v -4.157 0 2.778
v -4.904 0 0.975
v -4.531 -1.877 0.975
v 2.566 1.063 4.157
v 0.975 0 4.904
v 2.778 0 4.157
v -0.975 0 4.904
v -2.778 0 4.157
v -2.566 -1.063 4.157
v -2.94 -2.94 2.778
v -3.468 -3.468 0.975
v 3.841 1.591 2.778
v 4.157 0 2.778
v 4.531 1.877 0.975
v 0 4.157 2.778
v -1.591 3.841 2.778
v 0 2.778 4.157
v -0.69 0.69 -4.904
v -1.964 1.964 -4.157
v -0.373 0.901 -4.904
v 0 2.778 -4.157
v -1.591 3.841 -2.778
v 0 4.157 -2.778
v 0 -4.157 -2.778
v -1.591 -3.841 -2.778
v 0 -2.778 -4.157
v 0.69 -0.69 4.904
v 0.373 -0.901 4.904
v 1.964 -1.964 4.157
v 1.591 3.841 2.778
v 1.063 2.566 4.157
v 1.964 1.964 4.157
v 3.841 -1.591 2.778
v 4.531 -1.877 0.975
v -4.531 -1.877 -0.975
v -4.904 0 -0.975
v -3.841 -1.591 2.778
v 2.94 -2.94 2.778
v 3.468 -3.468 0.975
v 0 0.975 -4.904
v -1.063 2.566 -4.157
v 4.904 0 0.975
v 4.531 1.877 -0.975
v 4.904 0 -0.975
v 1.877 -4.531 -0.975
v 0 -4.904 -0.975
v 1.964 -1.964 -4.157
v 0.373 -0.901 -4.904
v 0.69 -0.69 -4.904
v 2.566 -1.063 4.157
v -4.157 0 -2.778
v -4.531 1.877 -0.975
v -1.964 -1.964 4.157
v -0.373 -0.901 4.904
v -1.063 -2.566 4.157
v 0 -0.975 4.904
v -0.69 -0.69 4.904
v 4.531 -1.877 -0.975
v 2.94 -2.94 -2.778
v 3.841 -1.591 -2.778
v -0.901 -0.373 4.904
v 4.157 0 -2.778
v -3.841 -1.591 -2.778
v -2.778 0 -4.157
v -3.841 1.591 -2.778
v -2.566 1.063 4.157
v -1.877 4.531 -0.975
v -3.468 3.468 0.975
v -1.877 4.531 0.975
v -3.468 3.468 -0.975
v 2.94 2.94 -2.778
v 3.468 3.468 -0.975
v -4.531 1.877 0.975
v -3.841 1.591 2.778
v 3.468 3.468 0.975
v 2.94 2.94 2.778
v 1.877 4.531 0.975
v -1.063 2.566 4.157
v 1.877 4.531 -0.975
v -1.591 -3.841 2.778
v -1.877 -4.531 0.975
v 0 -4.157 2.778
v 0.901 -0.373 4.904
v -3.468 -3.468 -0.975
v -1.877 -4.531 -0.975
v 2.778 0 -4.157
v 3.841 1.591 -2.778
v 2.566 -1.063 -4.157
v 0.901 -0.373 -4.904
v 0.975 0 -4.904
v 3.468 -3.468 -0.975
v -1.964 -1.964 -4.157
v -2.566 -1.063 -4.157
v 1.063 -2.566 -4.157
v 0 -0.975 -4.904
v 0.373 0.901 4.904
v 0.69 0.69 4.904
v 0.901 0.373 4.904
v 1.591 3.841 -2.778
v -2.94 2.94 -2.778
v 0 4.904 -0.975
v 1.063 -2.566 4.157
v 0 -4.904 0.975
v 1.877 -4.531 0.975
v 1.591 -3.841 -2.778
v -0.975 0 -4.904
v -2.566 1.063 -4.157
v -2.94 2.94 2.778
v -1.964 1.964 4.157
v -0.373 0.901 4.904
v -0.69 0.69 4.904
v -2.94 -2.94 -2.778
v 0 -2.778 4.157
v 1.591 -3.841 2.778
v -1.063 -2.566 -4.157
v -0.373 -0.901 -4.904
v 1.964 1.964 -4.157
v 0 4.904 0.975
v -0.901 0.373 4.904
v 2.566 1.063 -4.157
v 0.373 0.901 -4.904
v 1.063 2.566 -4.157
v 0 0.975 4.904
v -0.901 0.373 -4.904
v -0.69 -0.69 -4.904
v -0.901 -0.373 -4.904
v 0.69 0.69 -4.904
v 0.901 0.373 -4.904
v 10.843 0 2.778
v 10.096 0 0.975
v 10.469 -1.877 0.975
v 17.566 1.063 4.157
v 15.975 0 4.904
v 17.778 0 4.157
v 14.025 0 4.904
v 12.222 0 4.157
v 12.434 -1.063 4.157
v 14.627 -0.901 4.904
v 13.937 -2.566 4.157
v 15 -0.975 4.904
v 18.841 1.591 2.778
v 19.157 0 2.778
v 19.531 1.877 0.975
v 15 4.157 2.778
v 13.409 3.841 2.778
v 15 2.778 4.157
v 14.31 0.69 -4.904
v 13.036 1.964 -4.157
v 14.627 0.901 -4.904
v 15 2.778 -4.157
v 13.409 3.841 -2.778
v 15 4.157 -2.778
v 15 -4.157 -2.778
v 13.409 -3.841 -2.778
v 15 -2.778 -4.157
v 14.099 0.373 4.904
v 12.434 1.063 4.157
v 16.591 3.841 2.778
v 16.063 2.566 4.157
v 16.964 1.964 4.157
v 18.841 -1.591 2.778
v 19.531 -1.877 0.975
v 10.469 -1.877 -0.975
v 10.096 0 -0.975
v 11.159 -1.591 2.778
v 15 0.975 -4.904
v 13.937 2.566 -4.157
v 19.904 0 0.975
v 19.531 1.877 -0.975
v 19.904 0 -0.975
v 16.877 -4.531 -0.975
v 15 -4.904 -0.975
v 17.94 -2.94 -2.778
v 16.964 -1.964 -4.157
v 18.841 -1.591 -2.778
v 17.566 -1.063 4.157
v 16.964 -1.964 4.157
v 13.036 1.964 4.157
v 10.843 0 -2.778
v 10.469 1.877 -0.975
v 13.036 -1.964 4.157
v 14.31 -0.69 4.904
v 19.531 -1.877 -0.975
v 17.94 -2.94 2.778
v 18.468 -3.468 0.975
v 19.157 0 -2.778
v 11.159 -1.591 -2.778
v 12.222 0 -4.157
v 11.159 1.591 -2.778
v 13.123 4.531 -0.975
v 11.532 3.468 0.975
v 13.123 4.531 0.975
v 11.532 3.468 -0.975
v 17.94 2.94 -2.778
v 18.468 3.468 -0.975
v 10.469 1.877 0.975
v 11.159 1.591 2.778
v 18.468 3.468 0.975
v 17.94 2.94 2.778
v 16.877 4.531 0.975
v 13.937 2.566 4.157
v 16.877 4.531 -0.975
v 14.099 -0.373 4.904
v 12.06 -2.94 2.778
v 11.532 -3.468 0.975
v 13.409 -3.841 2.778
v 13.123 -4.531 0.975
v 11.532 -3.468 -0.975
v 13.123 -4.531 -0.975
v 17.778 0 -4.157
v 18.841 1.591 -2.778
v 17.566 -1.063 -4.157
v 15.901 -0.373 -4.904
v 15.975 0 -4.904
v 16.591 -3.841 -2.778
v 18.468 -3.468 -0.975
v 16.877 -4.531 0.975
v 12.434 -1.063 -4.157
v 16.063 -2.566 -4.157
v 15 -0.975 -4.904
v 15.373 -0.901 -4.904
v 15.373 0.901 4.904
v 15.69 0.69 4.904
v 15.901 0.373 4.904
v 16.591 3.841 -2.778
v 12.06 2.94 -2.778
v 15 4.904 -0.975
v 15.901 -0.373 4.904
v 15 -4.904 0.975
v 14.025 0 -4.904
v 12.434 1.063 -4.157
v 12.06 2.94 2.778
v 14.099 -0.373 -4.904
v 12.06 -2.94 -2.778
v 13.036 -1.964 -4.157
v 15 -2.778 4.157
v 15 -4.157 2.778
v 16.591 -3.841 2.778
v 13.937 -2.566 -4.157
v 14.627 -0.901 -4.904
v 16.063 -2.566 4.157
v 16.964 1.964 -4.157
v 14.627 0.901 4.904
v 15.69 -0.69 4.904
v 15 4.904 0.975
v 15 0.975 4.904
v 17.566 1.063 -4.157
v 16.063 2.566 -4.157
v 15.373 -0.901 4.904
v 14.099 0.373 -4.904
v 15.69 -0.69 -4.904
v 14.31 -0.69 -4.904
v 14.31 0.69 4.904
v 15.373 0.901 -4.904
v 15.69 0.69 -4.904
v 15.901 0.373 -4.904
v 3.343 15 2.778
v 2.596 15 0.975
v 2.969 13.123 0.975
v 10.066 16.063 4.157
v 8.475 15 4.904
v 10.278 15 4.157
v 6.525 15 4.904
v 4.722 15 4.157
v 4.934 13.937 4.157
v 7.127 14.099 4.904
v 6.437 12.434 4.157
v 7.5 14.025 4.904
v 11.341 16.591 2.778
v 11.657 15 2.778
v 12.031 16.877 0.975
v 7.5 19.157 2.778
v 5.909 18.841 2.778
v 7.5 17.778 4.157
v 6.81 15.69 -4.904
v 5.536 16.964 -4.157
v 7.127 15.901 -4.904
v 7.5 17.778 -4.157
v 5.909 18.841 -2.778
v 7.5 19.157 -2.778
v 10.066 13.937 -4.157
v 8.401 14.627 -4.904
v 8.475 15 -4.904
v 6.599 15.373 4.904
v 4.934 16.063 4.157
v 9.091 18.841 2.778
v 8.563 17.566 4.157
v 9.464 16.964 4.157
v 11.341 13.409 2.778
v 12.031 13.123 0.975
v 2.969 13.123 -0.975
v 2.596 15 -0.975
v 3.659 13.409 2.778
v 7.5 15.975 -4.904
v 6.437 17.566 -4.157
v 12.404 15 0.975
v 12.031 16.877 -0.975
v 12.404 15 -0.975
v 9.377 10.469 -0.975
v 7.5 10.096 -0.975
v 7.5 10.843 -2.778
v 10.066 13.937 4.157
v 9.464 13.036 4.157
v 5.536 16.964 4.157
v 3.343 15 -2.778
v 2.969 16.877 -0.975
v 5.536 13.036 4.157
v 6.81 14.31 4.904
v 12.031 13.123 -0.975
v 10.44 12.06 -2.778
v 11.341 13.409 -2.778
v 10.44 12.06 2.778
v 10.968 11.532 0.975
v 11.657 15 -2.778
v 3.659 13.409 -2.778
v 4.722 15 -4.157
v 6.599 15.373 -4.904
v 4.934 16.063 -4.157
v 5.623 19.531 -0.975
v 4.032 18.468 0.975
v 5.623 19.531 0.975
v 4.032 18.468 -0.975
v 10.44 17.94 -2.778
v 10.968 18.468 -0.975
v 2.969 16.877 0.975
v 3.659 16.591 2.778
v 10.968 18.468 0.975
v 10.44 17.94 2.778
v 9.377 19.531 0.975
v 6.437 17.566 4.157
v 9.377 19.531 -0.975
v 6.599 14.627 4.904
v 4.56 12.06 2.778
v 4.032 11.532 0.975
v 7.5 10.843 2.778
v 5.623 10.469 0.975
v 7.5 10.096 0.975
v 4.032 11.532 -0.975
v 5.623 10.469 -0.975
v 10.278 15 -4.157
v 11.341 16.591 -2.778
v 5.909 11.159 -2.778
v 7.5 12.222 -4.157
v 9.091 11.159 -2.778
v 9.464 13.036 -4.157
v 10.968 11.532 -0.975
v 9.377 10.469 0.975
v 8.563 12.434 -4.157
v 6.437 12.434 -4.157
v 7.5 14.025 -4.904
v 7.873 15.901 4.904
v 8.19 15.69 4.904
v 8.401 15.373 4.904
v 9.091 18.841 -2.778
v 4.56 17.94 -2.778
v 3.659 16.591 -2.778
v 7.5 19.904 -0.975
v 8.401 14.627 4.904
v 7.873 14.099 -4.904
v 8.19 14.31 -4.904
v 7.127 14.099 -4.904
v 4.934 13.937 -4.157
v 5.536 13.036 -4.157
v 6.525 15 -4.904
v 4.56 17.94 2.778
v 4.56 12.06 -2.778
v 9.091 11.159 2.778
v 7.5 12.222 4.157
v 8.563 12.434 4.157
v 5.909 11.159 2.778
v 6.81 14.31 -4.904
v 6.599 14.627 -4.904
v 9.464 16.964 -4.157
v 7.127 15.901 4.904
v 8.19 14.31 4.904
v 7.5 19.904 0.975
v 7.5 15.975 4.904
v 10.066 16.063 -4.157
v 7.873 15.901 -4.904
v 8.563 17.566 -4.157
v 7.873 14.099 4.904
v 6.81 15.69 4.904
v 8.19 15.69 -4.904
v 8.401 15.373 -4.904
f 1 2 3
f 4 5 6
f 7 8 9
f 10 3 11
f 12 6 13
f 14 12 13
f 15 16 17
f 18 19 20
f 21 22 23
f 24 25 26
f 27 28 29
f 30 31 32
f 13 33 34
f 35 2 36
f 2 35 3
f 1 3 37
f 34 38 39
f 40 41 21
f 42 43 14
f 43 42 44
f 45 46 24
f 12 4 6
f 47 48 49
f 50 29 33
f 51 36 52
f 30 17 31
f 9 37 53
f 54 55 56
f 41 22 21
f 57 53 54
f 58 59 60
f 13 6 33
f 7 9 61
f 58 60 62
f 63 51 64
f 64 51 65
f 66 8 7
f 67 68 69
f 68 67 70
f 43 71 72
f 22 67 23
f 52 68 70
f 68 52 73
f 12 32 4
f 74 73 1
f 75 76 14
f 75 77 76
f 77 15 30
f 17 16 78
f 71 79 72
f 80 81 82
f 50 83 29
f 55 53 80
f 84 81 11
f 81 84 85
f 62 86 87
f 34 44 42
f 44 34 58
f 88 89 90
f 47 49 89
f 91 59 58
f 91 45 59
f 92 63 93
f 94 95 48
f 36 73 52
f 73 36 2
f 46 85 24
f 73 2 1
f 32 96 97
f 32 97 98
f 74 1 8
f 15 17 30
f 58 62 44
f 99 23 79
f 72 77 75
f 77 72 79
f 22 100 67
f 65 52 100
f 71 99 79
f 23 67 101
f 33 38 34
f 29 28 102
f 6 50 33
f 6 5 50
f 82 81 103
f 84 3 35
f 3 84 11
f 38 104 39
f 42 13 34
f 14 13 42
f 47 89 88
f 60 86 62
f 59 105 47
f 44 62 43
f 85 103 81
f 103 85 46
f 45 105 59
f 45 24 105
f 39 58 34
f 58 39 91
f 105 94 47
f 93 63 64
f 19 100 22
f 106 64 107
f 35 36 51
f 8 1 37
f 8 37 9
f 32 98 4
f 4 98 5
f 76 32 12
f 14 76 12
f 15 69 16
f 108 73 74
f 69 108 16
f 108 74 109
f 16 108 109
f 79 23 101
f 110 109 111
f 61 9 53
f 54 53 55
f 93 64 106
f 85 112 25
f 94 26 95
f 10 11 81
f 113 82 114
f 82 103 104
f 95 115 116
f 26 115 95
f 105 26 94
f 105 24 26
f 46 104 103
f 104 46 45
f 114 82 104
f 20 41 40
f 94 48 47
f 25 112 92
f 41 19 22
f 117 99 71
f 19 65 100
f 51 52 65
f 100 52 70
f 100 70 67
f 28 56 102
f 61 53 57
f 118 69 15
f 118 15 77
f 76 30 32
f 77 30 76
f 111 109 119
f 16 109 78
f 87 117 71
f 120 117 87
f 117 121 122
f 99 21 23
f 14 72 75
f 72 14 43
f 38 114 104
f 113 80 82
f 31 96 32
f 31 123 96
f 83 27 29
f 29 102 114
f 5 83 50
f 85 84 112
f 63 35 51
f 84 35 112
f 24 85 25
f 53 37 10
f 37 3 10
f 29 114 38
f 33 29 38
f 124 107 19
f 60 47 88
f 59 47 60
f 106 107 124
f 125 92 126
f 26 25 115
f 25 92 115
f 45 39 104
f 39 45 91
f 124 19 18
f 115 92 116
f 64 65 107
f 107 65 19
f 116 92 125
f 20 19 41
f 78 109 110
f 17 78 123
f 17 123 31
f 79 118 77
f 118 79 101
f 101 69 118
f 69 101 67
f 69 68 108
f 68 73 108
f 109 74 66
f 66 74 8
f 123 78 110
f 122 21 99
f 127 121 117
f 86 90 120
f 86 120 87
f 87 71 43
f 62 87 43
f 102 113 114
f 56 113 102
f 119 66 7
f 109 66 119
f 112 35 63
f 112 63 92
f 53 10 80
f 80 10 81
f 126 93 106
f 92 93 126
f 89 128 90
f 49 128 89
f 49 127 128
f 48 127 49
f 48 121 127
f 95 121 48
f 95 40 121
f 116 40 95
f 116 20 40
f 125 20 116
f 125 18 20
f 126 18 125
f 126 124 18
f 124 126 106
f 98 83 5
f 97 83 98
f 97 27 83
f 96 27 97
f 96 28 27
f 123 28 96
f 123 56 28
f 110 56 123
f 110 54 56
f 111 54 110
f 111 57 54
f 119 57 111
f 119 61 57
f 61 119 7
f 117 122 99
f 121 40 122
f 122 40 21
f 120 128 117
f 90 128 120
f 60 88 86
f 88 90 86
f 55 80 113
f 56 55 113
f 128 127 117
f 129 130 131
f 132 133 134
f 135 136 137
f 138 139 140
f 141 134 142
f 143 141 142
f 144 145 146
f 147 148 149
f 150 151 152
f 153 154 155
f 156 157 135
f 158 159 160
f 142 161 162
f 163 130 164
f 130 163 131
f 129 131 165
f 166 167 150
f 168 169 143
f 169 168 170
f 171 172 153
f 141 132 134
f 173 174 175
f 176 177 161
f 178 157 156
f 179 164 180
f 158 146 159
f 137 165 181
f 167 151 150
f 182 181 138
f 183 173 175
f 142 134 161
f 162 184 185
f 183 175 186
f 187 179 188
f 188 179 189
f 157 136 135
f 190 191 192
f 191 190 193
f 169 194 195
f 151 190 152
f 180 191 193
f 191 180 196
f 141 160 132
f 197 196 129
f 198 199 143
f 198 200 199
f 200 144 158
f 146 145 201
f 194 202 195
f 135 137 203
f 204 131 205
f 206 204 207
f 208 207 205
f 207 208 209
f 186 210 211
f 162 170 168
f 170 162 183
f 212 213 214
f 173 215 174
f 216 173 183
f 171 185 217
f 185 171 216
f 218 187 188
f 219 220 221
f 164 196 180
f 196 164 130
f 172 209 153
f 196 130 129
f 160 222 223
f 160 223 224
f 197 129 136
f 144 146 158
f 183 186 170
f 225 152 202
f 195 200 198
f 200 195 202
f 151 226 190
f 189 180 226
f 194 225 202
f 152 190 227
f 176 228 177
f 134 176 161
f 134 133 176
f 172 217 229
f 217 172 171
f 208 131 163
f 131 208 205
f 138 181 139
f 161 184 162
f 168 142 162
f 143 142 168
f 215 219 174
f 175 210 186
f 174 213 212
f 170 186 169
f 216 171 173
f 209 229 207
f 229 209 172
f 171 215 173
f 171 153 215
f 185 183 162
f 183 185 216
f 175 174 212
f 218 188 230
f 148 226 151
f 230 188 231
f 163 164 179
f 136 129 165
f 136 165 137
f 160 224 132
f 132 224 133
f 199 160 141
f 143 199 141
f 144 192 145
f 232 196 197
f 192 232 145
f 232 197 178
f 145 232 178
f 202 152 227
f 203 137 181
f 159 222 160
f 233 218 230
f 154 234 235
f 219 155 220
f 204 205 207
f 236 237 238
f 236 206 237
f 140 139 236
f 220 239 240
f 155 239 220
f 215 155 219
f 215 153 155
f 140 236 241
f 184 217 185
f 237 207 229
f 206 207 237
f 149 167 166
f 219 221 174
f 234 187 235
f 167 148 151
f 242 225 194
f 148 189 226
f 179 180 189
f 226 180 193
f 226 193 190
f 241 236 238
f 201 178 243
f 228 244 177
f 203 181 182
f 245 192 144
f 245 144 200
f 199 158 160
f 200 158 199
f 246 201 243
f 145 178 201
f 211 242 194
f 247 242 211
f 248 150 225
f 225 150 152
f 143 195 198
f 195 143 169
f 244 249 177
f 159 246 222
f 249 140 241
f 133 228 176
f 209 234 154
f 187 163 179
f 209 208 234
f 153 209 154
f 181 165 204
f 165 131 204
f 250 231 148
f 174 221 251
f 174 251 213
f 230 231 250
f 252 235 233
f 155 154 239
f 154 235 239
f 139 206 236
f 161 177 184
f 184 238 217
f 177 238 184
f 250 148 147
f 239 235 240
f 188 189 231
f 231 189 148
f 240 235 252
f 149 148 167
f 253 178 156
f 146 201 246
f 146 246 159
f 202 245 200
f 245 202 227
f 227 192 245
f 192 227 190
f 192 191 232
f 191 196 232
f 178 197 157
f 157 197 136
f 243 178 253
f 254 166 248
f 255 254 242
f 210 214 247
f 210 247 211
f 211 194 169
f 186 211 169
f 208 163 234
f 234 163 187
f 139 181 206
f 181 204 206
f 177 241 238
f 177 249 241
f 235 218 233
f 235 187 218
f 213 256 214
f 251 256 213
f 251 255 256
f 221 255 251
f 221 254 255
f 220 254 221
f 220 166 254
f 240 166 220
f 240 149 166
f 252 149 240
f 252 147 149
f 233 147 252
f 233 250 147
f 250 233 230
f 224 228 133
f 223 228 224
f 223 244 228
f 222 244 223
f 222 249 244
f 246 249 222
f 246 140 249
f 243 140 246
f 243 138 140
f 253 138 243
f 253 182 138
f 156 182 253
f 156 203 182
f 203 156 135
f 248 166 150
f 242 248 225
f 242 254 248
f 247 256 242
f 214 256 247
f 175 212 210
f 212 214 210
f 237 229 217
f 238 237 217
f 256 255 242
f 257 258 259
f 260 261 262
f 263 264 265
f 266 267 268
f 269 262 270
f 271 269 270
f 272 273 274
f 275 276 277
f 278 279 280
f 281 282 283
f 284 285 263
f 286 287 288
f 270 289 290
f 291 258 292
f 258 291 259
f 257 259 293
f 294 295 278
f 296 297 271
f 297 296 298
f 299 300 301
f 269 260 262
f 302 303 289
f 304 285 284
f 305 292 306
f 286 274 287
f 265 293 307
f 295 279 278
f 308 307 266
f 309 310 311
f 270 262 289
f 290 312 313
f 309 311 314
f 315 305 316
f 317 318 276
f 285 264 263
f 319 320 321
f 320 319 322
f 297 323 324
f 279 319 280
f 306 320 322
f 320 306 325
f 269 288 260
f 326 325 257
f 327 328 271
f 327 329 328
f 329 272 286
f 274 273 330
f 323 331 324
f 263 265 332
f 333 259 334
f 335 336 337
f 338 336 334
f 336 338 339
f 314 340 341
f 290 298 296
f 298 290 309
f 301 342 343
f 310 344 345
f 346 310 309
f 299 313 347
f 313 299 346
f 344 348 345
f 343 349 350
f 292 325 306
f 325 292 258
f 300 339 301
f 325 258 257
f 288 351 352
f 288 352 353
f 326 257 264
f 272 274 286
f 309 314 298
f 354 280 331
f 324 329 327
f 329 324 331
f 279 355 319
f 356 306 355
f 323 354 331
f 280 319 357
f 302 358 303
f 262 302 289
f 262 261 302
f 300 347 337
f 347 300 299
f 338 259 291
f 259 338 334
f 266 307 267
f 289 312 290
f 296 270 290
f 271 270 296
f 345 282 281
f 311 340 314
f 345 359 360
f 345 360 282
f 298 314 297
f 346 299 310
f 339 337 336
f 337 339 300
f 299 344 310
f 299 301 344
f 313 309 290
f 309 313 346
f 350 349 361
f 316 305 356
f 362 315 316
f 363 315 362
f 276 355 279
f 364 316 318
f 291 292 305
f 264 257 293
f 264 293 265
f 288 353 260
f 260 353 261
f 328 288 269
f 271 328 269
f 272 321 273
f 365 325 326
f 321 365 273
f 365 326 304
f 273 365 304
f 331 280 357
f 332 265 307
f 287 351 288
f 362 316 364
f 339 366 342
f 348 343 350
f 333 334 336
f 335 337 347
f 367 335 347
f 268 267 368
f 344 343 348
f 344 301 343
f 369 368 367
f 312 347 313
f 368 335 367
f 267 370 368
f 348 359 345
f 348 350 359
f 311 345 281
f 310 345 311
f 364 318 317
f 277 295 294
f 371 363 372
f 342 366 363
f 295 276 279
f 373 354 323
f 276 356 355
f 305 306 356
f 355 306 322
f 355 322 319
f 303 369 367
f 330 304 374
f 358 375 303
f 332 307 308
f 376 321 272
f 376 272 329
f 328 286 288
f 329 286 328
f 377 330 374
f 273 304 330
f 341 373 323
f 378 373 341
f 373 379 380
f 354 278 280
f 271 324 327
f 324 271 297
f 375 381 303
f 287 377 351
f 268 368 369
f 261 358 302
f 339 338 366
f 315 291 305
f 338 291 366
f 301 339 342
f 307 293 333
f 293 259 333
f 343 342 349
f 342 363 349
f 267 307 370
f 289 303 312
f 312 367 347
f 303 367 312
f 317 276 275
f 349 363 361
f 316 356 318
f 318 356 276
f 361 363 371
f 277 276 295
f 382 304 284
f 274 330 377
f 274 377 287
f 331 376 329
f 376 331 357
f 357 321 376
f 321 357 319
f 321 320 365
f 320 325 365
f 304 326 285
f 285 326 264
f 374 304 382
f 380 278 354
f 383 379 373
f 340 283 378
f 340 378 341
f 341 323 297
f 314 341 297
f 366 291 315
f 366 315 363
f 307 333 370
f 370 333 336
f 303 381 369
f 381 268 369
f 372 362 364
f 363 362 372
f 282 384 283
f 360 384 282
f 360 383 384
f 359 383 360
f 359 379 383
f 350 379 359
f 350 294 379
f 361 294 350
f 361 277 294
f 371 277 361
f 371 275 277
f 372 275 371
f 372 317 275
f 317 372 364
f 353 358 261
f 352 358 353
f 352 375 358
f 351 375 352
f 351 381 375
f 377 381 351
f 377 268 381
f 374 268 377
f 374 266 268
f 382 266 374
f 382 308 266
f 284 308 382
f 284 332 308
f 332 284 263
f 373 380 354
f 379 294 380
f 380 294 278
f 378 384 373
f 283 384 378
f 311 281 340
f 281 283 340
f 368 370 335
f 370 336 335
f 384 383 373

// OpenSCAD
offset = 15;
rad = 5;
union() {
    translate([0, 0, 0]) sphere(r = rad);
    translate([offset, 0, 0]) sphere(r = rad);
    translate([offset / 2, offset, 0]) sphere(r = rad);
}
